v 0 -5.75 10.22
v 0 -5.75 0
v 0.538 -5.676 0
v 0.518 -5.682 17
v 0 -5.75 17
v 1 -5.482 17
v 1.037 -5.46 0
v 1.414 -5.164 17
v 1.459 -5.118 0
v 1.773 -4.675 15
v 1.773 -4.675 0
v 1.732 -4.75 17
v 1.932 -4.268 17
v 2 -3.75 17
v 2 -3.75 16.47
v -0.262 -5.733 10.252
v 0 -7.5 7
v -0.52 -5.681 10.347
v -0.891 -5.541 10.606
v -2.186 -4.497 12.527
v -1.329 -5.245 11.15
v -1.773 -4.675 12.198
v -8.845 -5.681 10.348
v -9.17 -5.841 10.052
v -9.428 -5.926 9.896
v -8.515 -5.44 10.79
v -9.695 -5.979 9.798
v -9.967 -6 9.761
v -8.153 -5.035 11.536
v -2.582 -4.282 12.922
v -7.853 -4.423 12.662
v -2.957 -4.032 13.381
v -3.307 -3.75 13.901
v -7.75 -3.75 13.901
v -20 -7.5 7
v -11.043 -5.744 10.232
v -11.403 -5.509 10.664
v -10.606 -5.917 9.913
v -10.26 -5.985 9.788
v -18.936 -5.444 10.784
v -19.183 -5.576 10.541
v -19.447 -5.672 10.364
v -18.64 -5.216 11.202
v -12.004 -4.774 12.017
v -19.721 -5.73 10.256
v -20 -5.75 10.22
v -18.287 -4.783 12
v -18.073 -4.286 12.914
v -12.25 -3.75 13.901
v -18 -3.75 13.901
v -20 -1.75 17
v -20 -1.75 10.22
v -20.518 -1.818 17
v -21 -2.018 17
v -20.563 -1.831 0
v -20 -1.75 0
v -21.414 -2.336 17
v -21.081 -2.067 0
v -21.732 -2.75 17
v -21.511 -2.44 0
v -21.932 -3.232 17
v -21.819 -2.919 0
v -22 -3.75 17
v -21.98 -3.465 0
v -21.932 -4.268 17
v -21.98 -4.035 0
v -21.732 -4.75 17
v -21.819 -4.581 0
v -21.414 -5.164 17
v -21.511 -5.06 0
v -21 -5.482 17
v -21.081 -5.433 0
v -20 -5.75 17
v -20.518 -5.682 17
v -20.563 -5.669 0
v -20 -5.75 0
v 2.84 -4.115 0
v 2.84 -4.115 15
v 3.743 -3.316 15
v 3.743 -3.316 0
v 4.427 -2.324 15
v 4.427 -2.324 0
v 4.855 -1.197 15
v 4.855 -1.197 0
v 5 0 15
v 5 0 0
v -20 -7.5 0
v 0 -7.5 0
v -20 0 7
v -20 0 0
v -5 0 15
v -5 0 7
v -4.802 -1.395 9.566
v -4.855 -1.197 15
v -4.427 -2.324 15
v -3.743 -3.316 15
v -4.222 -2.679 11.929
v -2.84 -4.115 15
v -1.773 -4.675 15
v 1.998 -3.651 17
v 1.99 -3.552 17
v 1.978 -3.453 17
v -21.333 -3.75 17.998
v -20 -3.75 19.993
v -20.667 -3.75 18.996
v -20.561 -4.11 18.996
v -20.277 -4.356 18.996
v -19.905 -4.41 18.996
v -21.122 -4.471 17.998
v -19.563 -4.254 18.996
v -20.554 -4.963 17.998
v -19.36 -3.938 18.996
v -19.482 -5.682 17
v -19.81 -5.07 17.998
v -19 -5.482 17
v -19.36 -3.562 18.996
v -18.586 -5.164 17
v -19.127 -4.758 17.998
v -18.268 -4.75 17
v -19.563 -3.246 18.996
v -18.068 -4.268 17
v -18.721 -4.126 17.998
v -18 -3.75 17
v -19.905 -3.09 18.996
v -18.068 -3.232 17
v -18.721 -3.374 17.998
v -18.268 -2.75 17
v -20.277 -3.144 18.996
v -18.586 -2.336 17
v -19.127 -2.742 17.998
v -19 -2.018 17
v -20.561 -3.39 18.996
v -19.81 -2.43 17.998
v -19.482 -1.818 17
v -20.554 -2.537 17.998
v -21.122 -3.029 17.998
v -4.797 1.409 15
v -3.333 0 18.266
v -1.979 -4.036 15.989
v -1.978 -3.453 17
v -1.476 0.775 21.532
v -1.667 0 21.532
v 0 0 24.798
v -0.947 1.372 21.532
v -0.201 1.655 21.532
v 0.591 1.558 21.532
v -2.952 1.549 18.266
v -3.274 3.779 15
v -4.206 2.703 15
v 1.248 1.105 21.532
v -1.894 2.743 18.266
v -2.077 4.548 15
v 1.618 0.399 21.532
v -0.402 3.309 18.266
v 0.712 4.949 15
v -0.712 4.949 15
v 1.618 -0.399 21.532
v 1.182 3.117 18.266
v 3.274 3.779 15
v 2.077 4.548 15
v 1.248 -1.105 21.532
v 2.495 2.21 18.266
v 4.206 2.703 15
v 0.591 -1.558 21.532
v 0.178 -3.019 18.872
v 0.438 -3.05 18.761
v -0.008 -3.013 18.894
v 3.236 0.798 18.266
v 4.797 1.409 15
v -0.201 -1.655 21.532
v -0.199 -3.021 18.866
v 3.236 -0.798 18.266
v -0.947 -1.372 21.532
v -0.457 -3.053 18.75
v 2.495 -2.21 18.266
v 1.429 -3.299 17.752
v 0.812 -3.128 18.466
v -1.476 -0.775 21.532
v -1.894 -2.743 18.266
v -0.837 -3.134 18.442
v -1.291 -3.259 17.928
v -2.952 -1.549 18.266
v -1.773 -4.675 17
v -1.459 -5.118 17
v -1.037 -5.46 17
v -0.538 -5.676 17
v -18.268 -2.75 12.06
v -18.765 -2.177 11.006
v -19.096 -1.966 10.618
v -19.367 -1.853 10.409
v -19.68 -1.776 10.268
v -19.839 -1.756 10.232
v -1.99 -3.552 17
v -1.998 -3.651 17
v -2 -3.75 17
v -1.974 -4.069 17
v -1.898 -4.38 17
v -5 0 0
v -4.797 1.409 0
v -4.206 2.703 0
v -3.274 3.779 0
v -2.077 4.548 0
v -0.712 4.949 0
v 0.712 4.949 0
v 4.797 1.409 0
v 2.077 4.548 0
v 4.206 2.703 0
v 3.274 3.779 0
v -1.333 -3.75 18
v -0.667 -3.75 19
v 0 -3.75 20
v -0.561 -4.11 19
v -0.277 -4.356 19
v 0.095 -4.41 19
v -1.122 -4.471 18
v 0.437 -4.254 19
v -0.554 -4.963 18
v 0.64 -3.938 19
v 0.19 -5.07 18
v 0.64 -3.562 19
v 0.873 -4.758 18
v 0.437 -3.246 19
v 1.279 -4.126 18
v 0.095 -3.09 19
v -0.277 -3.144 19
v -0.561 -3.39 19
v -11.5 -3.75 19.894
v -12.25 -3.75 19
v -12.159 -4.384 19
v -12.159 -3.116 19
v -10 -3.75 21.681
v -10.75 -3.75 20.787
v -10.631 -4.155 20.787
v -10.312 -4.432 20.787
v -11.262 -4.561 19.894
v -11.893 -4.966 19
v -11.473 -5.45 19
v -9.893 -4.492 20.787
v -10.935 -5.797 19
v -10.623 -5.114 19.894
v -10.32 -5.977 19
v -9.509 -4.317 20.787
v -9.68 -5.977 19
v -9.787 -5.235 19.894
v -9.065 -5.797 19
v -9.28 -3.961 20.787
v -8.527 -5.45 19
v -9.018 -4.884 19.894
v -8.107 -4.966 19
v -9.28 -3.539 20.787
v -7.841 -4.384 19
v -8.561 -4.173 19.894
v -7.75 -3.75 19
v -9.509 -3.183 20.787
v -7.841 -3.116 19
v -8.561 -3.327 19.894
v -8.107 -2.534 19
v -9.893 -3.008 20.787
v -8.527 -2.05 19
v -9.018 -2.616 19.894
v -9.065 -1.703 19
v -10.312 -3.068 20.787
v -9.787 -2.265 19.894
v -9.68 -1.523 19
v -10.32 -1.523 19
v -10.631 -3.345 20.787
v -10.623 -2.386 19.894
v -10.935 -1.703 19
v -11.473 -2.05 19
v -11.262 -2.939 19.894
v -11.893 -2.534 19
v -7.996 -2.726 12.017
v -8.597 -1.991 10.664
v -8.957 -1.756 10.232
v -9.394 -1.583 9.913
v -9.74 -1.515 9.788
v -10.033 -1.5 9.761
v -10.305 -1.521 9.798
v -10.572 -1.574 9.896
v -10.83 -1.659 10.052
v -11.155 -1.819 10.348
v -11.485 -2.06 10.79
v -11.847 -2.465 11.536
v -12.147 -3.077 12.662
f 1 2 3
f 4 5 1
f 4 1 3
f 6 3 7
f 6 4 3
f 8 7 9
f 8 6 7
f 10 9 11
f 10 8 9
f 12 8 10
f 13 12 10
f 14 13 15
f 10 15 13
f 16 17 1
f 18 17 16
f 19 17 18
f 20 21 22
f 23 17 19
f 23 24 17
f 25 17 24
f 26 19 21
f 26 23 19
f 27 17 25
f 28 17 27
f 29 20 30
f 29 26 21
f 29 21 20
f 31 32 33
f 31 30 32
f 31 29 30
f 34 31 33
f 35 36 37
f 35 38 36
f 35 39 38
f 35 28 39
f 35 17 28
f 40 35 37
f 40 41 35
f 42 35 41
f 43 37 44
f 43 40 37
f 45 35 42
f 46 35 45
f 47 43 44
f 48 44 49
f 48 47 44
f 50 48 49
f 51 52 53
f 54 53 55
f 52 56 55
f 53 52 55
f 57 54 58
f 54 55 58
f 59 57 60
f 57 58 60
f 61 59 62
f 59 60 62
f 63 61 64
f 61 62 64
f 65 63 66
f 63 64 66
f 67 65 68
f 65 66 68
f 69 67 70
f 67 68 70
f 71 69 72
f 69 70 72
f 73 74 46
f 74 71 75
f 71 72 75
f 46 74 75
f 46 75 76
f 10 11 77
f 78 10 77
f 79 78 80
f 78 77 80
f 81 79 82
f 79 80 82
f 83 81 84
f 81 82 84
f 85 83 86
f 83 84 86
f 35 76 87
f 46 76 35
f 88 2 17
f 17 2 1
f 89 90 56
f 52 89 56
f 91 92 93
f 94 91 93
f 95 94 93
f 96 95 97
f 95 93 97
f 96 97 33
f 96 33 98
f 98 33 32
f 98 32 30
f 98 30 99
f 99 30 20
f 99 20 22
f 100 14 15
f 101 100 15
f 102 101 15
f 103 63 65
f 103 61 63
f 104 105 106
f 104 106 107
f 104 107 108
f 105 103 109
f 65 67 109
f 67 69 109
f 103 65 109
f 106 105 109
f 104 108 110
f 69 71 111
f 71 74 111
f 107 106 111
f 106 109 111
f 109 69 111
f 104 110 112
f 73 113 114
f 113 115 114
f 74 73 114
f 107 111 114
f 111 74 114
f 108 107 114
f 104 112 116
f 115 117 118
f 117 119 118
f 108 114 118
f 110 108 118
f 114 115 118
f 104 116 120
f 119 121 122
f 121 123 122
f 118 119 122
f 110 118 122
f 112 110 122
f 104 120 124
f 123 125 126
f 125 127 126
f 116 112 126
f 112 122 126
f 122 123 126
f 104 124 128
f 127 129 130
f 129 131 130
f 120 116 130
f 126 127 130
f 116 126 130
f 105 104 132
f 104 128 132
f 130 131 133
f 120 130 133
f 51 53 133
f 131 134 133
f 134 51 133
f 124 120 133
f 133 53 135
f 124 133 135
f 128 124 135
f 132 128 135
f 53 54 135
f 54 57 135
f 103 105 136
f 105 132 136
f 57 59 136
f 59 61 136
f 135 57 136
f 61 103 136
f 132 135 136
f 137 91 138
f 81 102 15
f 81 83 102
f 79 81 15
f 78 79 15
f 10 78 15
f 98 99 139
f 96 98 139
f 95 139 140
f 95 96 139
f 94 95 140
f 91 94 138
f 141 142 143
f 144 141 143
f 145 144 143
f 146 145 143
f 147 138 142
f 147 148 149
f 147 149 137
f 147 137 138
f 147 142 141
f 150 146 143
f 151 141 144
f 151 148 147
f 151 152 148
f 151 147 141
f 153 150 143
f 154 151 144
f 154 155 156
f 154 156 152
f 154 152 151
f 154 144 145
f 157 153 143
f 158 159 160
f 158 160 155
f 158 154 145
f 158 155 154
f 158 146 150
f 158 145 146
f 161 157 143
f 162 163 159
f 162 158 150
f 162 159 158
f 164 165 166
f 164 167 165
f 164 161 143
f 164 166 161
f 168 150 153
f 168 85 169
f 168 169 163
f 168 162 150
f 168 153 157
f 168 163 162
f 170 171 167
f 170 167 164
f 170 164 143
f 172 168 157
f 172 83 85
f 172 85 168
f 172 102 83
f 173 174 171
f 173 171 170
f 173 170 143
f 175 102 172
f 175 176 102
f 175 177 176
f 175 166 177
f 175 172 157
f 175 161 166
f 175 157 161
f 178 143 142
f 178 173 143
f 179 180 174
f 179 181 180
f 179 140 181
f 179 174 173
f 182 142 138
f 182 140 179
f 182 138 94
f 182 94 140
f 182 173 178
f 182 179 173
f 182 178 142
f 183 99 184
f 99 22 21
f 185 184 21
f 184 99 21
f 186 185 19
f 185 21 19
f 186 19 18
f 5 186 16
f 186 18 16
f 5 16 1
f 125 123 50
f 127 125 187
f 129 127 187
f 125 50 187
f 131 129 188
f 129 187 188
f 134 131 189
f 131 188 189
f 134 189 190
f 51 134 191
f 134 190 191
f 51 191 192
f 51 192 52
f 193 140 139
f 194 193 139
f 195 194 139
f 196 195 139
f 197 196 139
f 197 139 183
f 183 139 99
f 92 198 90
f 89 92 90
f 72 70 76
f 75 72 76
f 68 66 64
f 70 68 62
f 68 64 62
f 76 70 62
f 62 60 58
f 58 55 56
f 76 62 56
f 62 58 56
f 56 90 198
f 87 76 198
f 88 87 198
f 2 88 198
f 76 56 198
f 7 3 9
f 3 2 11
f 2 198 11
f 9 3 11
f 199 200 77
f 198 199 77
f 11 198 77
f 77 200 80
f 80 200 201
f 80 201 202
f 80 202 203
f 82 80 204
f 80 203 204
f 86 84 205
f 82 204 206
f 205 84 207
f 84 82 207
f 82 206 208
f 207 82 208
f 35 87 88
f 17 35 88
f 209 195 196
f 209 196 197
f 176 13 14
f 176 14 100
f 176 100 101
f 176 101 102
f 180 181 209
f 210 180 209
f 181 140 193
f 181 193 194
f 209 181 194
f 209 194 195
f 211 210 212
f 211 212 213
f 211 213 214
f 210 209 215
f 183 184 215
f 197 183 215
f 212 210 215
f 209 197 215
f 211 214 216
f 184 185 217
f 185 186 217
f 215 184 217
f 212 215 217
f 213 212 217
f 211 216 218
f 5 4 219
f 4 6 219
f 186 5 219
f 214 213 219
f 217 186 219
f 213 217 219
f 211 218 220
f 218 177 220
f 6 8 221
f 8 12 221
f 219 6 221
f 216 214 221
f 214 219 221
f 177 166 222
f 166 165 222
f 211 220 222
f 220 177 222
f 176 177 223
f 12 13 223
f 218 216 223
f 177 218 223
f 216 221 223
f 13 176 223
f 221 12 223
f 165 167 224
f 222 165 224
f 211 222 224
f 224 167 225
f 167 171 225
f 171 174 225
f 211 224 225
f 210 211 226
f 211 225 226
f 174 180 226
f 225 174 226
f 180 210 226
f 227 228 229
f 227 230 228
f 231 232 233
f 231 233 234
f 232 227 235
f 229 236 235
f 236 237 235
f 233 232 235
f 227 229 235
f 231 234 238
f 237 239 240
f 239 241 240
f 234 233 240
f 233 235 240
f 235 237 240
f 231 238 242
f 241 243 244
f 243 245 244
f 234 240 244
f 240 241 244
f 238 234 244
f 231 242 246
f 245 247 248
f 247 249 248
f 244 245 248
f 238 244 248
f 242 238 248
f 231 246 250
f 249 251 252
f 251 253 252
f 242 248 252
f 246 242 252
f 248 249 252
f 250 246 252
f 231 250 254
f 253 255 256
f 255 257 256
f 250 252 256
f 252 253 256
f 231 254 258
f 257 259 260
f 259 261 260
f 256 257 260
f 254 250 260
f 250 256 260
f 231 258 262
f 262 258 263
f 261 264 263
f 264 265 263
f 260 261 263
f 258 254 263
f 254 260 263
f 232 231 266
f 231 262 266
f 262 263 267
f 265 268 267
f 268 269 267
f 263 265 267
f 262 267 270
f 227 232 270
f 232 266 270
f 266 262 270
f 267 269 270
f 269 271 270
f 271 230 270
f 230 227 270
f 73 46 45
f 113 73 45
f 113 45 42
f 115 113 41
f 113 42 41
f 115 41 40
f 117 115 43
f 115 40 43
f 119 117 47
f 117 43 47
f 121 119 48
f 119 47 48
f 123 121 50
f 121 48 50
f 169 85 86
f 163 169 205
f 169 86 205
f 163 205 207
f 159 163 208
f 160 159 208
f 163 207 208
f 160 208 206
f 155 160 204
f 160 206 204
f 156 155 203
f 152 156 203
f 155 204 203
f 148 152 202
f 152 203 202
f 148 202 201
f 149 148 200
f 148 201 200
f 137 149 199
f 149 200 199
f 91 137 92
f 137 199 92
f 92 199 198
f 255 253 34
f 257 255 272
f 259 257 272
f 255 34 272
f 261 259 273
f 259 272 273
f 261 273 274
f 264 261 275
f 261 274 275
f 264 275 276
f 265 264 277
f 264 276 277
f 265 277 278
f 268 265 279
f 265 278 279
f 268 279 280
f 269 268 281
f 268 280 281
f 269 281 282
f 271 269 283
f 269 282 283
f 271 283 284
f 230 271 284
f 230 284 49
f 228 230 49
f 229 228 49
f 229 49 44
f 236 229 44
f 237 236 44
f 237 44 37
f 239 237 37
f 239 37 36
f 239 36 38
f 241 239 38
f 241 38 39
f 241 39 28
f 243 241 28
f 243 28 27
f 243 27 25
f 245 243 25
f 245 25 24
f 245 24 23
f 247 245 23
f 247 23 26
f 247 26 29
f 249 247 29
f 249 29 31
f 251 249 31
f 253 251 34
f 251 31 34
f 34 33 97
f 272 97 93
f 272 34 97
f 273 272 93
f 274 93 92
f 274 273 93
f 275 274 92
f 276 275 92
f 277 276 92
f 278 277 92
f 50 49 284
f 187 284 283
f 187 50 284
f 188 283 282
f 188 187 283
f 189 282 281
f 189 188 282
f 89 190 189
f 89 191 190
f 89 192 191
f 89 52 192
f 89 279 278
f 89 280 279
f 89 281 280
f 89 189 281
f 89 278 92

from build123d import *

# Parameters (mm, degrees)
F1_DEPTH      = 15
F2_DEPTH      = 7
F6_DEPTH      = 10
F6_DEPTH_BACK = 7
F5_R          = 2.25
F7_DEPTH      = 12
F9_DEPTH      = 20


with BuildPart() as f1:
    # F0 (on Top) → F1 (new body)
    with BuildSketch(Plane.XY):
        with BuildLine():
            ThreePointArc((0, -5), (3.5355339059, -3.5355339059), (5, 0))
            ThreePointArc((5, 0), (0, 5), (-5, 0))
            Line((-5, 0), (0, 0))
            Line((0, 0), (0, -5))
        make_face()
        with BuildLine():
            Line((0, 0), (-5, 0))
            ThreePointArc((-5, 0), (-3.5355339059, -3.5355339059), (0, -5))
            Line((0, -5), (0, 0))
        make_face()
    extrude(amount=F1_DEPTH)

    # F0 (on Top) → F2 (join)
    with BuildSketch(Plane.XY):
        with BuildLine():
            ThreePointArc((0, -5), (-3.5355339059, -3.5355339059), (-5, 0))
            Line((-5, 0), (-20, 0))
            Line((-20, 0), (-20, -7.5))
            Line((-20, -7.5), (0, -7.5))
            Line((0, -7.5), (0, -5))
        make_face()
    extrude(amount=F2_DEPTH)

    # F3 (on Front) → F4 (revolve)
    with BuildSketch(Plane.XZ):
        Polygon((0, 24.7979589711), (-5, 15), (0, 15), align=None)
    revolve(axis=Axis((0, 0, 19.8989794856), (0, 0, -1)))

    # F5 (on face) → F6 (join, two sides)
    with BuildSketch(Plane.XY.offset(7)) as f6_sk:
        with BuildLine():
            ThreePointArc((0, -5), (-0.9013878189, -4.9180788932), (-1.7732385626, -4.675))
            ThreePointArc((-1.7732385626, -4.675), (-1.0368220677, -5.4602631376), (0, -5.75))
            Line((0, -5.75), (0, -5))
        make_face()
        with BuildLine():
            ThreePointArc((2, -3.75), (-0.4761947473, -1.8075174228), (-1.7732385626, -4.675))
            ThreePointArc((-1.7732385626, -4.675), (-0.9013878189, -4.9180788932), (0, -5))
            Line((0, -5), (0, -5.75))
            ThreePointArc((0, -5.75), (1.4142135624, -5.1642135624), (2, -3.75))
        make_face()
        with BuildLine():
            Line((-20, -5.75), (-20, -1.75))
            ThreePointArc((-20, -1.75), (-22, -3.75), (-20, -5.75))
        make_face()
        with BuildLine():
            ThreePointArc((-20, -5.75), (-18.5857864376, -5.1642135624), (-18, -3.75))
            ThreePointArc((-18, -3.75), (-18.5857864376, -2.3357864376), (-20, -1.75))
            Line((-20, -1.75), (-20, -5.75))
        make_face()
    extrude(amount=F6_DEPTH)
    extrude(f6_sk.sketch, amount=-F6_DEPTH_BACK)

    # F5 (on face) → F7 (join)
    with BuildSketch(Plane.XY.offset(7)):
        with Locations((-10, -3.75)):
            Circle(F5_R)
    extrude(amount=F7_DEPTH)

    # F8 (on face) → F9 (join, through all)
    with BuildSketch(Plane(origin=(-20, 0, 0), x_dir=(0, -1, 0), z_dir=(-1, 0, 0))):
        Polygon((3.75, 13.9005221426), (0, 7), (1.75, 7), (5.75, 7), (7.5, 7), align=None)
    extrude(amount=-F9_DEPTH)

    # F11 (on face) → F12 (revolve)
    with BuildSketch(Plane.XZ.offset(3.75)):
        Polygon((-20, 19.9933259094), (-22, 17), (-20, 17), align=None)
    revolve(axis=Axis((-20, -3.75, 18.7693270892), (0, 0, 1)))

    # F11 (on face) → F13 (revolve)
    with BuildSketch(Plane.XZ.offset(3.75)):
        Polygon((-10, 21.6809513237), (-12.25, 19), (-10, 19), align=None)
    revolve(axis=Axis((-10, -3.75, 21.5624834672), (0, 0, 1)))

    # F11 (on face) → F14 (revolve)
    with BuildSketch(Plane.XZ.offset(3.75)):
        Polygon((0, 20), (-2, 17), (0, 17), align=None)
    revolve(axis=Axis((0, -3.75, 19.2562113553), (0, 0, 1)))


solid = f1.part
